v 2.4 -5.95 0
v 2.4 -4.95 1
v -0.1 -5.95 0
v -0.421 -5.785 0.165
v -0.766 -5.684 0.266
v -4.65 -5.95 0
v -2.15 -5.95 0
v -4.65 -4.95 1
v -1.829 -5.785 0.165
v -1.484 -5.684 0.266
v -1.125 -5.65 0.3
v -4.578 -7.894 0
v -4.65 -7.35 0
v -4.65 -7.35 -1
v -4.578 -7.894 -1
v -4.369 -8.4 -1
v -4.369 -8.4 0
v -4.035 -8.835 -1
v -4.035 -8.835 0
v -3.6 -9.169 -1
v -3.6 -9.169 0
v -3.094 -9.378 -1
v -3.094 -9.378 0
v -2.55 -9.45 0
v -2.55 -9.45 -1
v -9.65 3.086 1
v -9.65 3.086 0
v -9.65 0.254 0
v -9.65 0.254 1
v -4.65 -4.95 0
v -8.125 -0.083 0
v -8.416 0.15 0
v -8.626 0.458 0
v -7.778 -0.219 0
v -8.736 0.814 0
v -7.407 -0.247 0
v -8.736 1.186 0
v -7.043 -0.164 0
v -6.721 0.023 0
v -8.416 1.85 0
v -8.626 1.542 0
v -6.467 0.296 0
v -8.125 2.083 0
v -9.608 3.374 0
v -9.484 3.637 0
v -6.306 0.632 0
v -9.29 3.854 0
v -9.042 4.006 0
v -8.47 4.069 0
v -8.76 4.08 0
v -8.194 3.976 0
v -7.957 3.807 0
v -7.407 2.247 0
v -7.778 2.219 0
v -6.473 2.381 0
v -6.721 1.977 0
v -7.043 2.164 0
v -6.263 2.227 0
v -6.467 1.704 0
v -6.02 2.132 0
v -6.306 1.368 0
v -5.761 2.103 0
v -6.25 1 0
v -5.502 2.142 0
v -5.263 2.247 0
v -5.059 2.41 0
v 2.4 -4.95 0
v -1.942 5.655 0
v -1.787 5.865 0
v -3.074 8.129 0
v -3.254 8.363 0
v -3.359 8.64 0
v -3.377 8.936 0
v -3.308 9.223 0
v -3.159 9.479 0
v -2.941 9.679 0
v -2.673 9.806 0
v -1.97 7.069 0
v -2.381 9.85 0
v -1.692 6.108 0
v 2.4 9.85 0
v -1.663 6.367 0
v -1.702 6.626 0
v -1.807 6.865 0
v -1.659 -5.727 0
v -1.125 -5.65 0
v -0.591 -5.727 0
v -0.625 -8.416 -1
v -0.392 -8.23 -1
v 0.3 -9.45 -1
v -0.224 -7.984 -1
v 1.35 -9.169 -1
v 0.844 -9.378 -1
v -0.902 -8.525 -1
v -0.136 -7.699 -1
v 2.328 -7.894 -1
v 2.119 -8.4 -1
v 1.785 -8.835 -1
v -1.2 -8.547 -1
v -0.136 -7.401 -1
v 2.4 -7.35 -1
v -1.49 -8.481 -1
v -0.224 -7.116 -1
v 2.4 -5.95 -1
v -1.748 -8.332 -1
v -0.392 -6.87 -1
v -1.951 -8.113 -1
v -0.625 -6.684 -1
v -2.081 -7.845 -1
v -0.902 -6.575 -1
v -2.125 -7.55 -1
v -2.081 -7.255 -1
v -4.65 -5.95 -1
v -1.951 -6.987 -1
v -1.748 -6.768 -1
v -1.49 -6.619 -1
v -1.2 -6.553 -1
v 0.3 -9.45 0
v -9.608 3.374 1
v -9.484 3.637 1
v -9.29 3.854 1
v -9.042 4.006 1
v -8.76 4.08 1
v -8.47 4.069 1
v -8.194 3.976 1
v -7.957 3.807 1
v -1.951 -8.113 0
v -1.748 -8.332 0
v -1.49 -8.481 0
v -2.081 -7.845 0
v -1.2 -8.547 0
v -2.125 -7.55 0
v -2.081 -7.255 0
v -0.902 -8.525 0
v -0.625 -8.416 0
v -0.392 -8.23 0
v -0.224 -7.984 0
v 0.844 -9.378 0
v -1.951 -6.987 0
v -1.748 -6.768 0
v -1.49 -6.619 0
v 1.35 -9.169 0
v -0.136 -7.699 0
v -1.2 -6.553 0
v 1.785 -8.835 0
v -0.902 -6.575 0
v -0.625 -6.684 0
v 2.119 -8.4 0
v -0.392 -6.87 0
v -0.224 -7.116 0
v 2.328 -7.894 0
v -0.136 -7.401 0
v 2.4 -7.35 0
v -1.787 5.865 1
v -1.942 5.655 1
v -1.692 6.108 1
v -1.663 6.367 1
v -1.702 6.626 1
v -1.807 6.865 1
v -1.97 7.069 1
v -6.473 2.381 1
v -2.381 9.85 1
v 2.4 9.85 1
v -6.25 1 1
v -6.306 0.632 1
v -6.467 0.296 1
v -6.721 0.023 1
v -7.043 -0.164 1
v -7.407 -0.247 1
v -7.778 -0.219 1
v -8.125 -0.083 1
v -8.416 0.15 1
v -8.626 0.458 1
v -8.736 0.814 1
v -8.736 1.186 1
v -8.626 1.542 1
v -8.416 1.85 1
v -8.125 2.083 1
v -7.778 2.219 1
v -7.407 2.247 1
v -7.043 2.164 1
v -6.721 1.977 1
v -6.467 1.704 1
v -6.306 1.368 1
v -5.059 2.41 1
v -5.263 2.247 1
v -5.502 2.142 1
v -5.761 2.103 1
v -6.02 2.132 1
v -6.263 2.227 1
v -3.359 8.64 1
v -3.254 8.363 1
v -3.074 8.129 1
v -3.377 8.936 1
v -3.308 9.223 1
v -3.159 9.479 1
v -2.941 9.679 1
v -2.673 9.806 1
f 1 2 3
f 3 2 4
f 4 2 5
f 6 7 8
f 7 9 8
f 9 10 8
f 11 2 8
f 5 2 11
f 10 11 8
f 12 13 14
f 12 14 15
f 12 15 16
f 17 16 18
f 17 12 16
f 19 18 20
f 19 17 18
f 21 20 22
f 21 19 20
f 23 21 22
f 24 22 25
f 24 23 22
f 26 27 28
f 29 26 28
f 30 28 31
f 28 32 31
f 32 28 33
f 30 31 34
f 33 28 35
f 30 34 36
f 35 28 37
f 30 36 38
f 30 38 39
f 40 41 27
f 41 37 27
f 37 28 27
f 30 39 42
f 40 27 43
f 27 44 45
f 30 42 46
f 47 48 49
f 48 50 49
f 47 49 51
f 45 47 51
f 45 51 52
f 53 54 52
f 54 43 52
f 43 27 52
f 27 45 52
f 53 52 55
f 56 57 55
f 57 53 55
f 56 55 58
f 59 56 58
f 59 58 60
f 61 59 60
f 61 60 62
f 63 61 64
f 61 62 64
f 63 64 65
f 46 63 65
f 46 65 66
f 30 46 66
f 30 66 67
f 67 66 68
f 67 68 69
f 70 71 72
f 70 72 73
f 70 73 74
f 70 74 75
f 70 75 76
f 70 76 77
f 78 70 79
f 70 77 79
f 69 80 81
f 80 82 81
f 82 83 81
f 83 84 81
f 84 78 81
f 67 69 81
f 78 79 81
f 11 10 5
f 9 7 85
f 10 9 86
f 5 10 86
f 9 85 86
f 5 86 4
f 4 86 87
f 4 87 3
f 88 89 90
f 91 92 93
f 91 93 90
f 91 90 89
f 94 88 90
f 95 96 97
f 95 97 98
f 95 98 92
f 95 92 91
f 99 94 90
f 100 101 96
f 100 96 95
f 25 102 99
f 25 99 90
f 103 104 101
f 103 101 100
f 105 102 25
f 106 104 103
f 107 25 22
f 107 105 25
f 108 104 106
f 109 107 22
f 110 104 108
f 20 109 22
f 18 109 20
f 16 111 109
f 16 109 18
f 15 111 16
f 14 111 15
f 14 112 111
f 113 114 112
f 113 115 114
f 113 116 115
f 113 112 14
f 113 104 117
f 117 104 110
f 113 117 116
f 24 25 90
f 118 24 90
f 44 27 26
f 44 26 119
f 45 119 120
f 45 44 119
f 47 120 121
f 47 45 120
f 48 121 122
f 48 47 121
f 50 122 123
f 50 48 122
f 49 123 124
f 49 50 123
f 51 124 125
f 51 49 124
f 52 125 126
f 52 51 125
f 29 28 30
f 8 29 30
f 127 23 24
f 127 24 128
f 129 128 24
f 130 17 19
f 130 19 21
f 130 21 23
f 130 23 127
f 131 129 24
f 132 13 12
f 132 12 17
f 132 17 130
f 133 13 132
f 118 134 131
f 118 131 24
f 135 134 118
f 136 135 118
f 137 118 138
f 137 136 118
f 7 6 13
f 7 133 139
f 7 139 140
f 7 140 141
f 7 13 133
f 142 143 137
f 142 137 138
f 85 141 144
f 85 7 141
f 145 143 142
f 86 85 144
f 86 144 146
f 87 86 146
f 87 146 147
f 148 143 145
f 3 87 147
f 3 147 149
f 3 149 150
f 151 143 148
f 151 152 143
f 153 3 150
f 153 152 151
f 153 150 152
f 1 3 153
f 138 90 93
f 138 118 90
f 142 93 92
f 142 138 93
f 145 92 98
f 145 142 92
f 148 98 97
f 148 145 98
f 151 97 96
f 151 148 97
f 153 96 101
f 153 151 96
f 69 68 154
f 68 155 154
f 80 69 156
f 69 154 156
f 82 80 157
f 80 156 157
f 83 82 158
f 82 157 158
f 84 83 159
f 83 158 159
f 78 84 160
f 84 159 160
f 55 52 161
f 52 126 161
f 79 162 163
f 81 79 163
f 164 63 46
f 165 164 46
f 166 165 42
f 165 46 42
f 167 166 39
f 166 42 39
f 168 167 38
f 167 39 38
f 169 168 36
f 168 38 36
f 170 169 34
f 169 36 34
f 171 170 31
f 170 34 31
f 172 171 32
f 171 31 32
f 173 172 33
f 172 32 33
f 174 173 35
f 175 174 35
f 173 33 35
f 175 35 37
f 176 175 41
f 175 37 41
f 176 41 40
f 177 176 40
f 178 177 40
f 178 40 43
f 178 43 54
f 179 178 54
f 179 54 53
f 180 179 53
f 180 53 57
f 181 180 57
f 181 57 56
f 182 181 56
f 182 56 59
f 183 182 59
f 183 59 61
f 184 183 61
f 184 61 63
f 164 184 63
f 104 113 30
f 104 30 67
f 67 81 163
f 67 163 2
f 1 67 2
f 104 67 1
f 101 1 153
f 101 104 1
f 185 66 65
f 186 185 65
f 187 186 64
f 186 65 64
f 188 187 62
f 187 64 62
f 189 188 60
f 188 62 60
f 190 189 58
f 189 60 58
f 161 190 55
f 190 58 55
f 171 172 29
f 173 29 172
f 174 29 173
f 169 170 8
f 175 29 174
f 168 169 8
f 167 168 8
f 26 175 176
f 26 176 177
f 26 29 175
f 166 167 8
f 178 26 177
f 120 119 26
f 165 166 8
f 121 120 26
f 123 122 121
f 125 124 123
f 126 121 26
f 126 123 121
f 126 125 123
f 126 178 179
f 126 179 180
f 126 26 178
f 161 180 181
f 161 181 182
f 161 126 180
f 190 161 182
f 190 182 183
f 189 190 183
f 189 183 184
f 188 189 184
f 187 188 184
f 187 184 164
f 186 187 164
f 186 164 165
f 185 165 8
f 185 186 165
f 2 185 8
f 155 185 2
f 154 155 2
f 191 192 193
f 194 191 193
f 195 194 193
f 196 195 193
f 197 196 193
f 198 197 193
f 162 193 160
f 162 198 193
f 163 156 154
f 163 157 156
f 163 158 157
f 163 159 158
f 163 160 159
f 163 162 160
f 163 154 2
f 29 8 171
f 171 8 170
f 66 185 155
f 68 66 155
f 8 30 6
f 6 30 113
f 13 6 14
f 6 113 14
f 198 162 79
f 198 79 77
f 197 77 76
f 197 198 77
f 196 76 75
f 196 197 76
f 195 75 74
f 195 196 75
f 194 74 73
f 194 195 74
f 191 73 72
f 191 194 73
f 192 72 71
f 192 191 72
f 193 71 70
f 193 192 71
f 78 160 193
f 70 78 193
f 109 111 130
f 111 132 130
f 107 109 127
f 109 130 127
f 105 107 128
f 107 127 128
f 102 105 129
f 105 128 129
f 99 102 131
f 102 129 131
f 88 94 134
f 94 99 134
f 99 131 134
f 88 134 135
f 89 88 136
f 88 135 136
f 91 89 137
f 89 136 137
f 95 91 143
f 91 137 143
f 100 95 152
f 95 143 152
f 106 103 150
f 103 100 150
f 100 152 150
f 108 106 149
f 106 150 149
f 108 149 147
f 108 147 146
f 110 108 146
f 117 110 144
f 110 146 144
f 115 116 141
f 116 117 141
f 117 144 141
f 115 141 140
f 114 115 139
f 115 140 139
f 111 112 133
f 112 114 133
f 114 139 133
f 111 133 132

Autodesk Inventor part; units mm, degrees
ref_plane "YZ Plane" through (0, 0, 0) normal (1, 0, 0) x (0, 1, 0)
ref_plane "XZ Plane" through (0, 0, 0) normal (0, 1, 0) x (-1, 0, 0)
ref_plane "XY Plane" through (0, 0, 0) normal (0, 0, 1) x (1, 0, 0)
sketch "Sketch1" plane through (0, 0, 0) normal (0, 0, 1) x (1, 0, 0)
  circle A0 centre (0, 0) radius 1.25
  line L0 (-4.75, 9.95) -> (2.5, 9.95)
  line L1 (2.5, 9.95) -> (2.5, -4.95)
  line L2 (2.5, -4.95) -> (-4.75, -4.95)
  line L3 (-4.75, -4.95) -> (-4.75, 9.95)
  line L4 (-4.75, 4.85) -> (-9.65, 4.85)
  line L5 (-9.65, 4.85) -> (-9.65, 0.15)
  line L6 (-9.65, 0.15) -> (-4.75, 0.15)
  line L7 (-4.75, 0.15) -> (-4.75, 4.85)
  line L8 (-4.75, -4.95) -> (-9.65, 0.15)
  line L9 (-9.65, 4.85) -> (-4.75, 9.95)
  line L10 (-9.65, 4.85) -> (-13.2555, 8.3141)
  line L11 (-4.75, 9.95) -> (-8.2862, 13.4862)
  line L12 (-13.2555, 8.3141) -> (-8.2862, 13.4862)
  circle A1 centre (-7.5, 1) radius 1.25
  line L13 (-9.5461, 4.9582) -> (-13.1516, 8.4223)
  line L14 (-4.8539, 9.8418) -> (-8.3902, 13.3781)
  line L15 (2.4, 9.95) -> (2.4, -4.95)
  line L16 (-9.65, 0.2541) -> (-4.65, -4.95)
  point P0 (-8.4165, 0.15)
  point P1 (-6.5835, 0.15)
  point P2 (-9.55, 0.15)
  point P3 (-4.75, -4.8459)
  dimension "d26" = 4.95
  dimension "d27" = 7.25
  dimension "d28" = 2.5
  dimension "d29" = 4.9
  dimension "d30" = 14.9
  dimension "d31" = 5.1
  dimension "d32" = 5.1
  dimension "d33" = 90
  dimension "d34" = 135
  dimension "d36" = 0
  dimension "d37" = 0
  dimension "d38" = 2.5
  dimension "d39" = 5
  dimension "d40" = 2.5
  dimension "d41" = 1
  dimension "d42" = 7.5
  dimension "d43" = 0.15
  dimension "d44" = 0.15
  dimension "d54" = 0.1
  dimension "d55" = 0.1
extrude "Extrusion1" add sketch "Sketch1" along normal blind 1 contours A0 | L0 L15 L2 L16 L3 | L3 L4 L9 | L3 L6 A1 L16 L5 L4 | L3 L16 L6 A1
sketch "Sketch7" plane through (0, 0, 0) normal (0, 0, -1) x (-1, 0, 0)
  line L0 (4.65, -4.95) -> (-2.4, -4.95) projected
  line L1 (9.65, 0.2541) -> (4.65, -4.95) projected
  line L2 (9.65, 4.85) -> (9.65, 0.2541) projected
  line L3 (4.75, 9.95) -> (9.65, 4.85) projected
  line L4 (-2.4, 9.95) -> (4.75, 9.95) projected
  line L5 (-2.4, -4.95) -> (-2.4, 9.95) projected
  circle A0 centre (7.5, 1) radius 1.25 projected
  line L6 (4.65, -4.95) -> (-2.4, -4.95) projected
  line L7 (-2.4, -4.95) -> (4.65, -4.95)
  line L8 (4.65, -4.95) -> (4.65, -9.45)
  line L9 (4.65, -9.45) -> (-2.4, -9.45)
  line L10 (-2.4, -9.45) -> (-2.4, -4.95)
  circle A1 centre (1.125, -7.55) radius 1
  line L11 (4.75, 9.95) -> (8.2855, 13.4855)
  line L12 (4.75, 9.95) -> (9.75, 9.95) construction
  line L13 (9.65, 4.85) -> (13.1855, 8.3855)
  line L14 (9.65, 4.85) -> (14.65, 4.85) construction
  line L15 (13.1855, 8.3855) -> (8.2855, 13.4855)
  line L16 (9.5114, 4.9942) -> (13.0469, 8.5298)
  line L17 (-2.4, -4.95) -> (-2.4, 9.95) projected
  line L18 (-2.4, 9.85) -> (4.8461, 9.85)
  line L19 (4.8461, 9.85) -> (8.3816, 13.3855)
  point P0 (0, 0)
  dimension "d56" = 0
  dimension "d57" = 4.5
  dimension "d58" = 2
  dimension "d59" = 3.525
  dimension "d60" = 2.6
  dimension "d63" = 5
  dimension "d64" = 45
  dimension "d65" = 5
  dimension "d66" = 45
  dimension "d68" = 0.2
  dimension "d69" = 0.1
extrude "Extrusion5" add sketch "Sketch7" against normal mid plane 2 contours L8 L9 L10 L0 | L19 L15 L16 L3
fillet "Fillet2" radius 2.1 2 edges at (-4.65, -9.45, 0) (2.4, -9.45, 0)
sketch "Sketch8" plane through (0, 0, 1) normal (0, 0, 1) x (1, 0, 0)
  line L0 (2.4, 9.95) -> (-4.75, 9.95) projected
  line L1 (-4.75, 9.95) -> (-4.8461, 9.85) projected
  line L2 (2.4, -7.35) -> (2.4, 9.95) projected
  line L3 (-4.75, 9.95) -> (-4.8461, 9.85) projected
  line L4 (-4.8461, 9.85) -> (2.4, 9.85)
  point P0 (0, 0)
extrude "Extrusion6" cut sketch "Sketch8" against normal up to surface (1 mm away)
chamfer "Chamfer1" distance 1 angle 45 2 edges at (-1.125, -4.95, -1) (-7.1787, 7.4221, -1)
sketch "Sketch9" plane through (0, 0, 1) normal (0, 0, 1) x (1, 0, 0)
  line L0 (-4.65, -4.95) -> (2.4, -4.95) projected
  line L1 (2.4, -5.95) -> (-4.65, -5.95) projected
  line L2 (2.4, 9.85) -> (-4.8461, 9.85) projected
  line L3 (-4.8461, 9.85) -> (-8.3816, 13.3855) projected
  line L4 (-8.3816, 13.3855) -> (-13.0469, 8.5298) projected
  line L5 (-13.0469, 8.5298) -> (-9.5114, 4.9942) projected
  line L6 (-9.5114, 4.9942) -> (-9.65, 4.85) projected
  line L7 (-9.65, 4.85) -> (-9.65, 0.2541) projected
  line L8 (-9.65, 0.2541) -> (-4.65, -4.95) projected
  line L9 (-4.65, -4.95) -> (-4.65, -7.35) projected
  arc A0 (-4.65, -7.35) -> (-2.55, -9.45) centre (-2.55, -7.35) ccw projected
  line L10 (-2.55, -9.45) -> (0.3, -9.45) projected
  arc A1 (0.3, -9.45) -> (2.4, -7.35) centre (0.3, -7.35) ccw projected
  line L11 (2.4, -7.35) -> (2.4, 9.85) projected
  circle A2 centre (-1.125, -7.55) radius 1 projected
  circle A3 centre (-7.5, 1) radius 1.25 projected
  point P0 (0, 0)
extrude "Extrusion7" cut sketch "Sketch9" against normal blind 1 contours L1 L11 A1 L10 A0 L9
chamfer "Chamfer2" distance 1 angle 45 1 edges at (-1.125, -5.95, 1)
sketch "Sketch10" plane through (0, 0, 0) normal (0, 0, 1) x (1, 0, 0)
  circle A0 centre (-1.125, -7.55) radius 1 projected
  circle A1 centre (-1.125, -7.55) radius 1.9
  point P0 (0, 0)
  dimension "d80" = 3.8
extrude "Extrusion8" cut sketch "Sketch10" along normal up to surface (1 mm away)
sketch "Sketch11" plane through (0, 0, 1) normal (0, 0, 1) x (1, 0, 0)
  line L0 (-6.2966, 11.2255) -> (-10.8, 6.5383)
  line L1 (-10.8, 6.5383) -> (-5.7523, 1.6886)
  line L2 (-5.7523, 1.6886) -> (-1.2489, 6.3757)
  line L3 (-1.2489, 6.3757) -> (-6.2966, 11.2255)
  line L4 (-6.2966, 11.2255) -> (-5.7523, 1.6886) construction
  line L5 (-10.8, 6.5383) -> (-1.2489, 6.3757) construction
  line L6 (-8.3816, 13.3855) -> (-13.0469, 8.5298) projected
  line L7 (-13.0469, 8.5298) -> (-9.5114, 4.9942) projected
  line L8 (-4.8461, 9.85) -> (-8.3816, 13.3855) projected
  line L9 (-4.8461, 9.85) -> (2.4, 9.85) projected
  line L10 (-4.8461, 9.85) -> (-4.8551, 9.8406)
  line L11 (-4.8461, 9.85) -> (-9.5114, 4.9942) projected
  point P0 (0, 0)
  point P1 (-6.0245, 6.457)
  point P2 (-10.9252, 6.408)
  point P3 (-6.2599, 11.2638)
  point P4 (-9.3585, 5.1534)
  dimension "d83" = 7
  dimension "d85" = 6.5
  dimension "d86" = 3.5
  dimension "d89" = 6.5
extrude "Extrusion9" cut sketch "Sketch11" against normal up to surface (2 mm away)
fillet "Fillet3" radius 1 1 edges at (-5.7523, 1.6886, 0.5)
fillet "Fillet4" radius 1 5 edges at (-9.3585, 5.1534, 0.5) (-9.65, 4.85, 0.5) (-1.2489, 6.3757, 0.5) (-4.8551, 9.8406, 0.5) (-4.8461, 9.85, 0.5)
